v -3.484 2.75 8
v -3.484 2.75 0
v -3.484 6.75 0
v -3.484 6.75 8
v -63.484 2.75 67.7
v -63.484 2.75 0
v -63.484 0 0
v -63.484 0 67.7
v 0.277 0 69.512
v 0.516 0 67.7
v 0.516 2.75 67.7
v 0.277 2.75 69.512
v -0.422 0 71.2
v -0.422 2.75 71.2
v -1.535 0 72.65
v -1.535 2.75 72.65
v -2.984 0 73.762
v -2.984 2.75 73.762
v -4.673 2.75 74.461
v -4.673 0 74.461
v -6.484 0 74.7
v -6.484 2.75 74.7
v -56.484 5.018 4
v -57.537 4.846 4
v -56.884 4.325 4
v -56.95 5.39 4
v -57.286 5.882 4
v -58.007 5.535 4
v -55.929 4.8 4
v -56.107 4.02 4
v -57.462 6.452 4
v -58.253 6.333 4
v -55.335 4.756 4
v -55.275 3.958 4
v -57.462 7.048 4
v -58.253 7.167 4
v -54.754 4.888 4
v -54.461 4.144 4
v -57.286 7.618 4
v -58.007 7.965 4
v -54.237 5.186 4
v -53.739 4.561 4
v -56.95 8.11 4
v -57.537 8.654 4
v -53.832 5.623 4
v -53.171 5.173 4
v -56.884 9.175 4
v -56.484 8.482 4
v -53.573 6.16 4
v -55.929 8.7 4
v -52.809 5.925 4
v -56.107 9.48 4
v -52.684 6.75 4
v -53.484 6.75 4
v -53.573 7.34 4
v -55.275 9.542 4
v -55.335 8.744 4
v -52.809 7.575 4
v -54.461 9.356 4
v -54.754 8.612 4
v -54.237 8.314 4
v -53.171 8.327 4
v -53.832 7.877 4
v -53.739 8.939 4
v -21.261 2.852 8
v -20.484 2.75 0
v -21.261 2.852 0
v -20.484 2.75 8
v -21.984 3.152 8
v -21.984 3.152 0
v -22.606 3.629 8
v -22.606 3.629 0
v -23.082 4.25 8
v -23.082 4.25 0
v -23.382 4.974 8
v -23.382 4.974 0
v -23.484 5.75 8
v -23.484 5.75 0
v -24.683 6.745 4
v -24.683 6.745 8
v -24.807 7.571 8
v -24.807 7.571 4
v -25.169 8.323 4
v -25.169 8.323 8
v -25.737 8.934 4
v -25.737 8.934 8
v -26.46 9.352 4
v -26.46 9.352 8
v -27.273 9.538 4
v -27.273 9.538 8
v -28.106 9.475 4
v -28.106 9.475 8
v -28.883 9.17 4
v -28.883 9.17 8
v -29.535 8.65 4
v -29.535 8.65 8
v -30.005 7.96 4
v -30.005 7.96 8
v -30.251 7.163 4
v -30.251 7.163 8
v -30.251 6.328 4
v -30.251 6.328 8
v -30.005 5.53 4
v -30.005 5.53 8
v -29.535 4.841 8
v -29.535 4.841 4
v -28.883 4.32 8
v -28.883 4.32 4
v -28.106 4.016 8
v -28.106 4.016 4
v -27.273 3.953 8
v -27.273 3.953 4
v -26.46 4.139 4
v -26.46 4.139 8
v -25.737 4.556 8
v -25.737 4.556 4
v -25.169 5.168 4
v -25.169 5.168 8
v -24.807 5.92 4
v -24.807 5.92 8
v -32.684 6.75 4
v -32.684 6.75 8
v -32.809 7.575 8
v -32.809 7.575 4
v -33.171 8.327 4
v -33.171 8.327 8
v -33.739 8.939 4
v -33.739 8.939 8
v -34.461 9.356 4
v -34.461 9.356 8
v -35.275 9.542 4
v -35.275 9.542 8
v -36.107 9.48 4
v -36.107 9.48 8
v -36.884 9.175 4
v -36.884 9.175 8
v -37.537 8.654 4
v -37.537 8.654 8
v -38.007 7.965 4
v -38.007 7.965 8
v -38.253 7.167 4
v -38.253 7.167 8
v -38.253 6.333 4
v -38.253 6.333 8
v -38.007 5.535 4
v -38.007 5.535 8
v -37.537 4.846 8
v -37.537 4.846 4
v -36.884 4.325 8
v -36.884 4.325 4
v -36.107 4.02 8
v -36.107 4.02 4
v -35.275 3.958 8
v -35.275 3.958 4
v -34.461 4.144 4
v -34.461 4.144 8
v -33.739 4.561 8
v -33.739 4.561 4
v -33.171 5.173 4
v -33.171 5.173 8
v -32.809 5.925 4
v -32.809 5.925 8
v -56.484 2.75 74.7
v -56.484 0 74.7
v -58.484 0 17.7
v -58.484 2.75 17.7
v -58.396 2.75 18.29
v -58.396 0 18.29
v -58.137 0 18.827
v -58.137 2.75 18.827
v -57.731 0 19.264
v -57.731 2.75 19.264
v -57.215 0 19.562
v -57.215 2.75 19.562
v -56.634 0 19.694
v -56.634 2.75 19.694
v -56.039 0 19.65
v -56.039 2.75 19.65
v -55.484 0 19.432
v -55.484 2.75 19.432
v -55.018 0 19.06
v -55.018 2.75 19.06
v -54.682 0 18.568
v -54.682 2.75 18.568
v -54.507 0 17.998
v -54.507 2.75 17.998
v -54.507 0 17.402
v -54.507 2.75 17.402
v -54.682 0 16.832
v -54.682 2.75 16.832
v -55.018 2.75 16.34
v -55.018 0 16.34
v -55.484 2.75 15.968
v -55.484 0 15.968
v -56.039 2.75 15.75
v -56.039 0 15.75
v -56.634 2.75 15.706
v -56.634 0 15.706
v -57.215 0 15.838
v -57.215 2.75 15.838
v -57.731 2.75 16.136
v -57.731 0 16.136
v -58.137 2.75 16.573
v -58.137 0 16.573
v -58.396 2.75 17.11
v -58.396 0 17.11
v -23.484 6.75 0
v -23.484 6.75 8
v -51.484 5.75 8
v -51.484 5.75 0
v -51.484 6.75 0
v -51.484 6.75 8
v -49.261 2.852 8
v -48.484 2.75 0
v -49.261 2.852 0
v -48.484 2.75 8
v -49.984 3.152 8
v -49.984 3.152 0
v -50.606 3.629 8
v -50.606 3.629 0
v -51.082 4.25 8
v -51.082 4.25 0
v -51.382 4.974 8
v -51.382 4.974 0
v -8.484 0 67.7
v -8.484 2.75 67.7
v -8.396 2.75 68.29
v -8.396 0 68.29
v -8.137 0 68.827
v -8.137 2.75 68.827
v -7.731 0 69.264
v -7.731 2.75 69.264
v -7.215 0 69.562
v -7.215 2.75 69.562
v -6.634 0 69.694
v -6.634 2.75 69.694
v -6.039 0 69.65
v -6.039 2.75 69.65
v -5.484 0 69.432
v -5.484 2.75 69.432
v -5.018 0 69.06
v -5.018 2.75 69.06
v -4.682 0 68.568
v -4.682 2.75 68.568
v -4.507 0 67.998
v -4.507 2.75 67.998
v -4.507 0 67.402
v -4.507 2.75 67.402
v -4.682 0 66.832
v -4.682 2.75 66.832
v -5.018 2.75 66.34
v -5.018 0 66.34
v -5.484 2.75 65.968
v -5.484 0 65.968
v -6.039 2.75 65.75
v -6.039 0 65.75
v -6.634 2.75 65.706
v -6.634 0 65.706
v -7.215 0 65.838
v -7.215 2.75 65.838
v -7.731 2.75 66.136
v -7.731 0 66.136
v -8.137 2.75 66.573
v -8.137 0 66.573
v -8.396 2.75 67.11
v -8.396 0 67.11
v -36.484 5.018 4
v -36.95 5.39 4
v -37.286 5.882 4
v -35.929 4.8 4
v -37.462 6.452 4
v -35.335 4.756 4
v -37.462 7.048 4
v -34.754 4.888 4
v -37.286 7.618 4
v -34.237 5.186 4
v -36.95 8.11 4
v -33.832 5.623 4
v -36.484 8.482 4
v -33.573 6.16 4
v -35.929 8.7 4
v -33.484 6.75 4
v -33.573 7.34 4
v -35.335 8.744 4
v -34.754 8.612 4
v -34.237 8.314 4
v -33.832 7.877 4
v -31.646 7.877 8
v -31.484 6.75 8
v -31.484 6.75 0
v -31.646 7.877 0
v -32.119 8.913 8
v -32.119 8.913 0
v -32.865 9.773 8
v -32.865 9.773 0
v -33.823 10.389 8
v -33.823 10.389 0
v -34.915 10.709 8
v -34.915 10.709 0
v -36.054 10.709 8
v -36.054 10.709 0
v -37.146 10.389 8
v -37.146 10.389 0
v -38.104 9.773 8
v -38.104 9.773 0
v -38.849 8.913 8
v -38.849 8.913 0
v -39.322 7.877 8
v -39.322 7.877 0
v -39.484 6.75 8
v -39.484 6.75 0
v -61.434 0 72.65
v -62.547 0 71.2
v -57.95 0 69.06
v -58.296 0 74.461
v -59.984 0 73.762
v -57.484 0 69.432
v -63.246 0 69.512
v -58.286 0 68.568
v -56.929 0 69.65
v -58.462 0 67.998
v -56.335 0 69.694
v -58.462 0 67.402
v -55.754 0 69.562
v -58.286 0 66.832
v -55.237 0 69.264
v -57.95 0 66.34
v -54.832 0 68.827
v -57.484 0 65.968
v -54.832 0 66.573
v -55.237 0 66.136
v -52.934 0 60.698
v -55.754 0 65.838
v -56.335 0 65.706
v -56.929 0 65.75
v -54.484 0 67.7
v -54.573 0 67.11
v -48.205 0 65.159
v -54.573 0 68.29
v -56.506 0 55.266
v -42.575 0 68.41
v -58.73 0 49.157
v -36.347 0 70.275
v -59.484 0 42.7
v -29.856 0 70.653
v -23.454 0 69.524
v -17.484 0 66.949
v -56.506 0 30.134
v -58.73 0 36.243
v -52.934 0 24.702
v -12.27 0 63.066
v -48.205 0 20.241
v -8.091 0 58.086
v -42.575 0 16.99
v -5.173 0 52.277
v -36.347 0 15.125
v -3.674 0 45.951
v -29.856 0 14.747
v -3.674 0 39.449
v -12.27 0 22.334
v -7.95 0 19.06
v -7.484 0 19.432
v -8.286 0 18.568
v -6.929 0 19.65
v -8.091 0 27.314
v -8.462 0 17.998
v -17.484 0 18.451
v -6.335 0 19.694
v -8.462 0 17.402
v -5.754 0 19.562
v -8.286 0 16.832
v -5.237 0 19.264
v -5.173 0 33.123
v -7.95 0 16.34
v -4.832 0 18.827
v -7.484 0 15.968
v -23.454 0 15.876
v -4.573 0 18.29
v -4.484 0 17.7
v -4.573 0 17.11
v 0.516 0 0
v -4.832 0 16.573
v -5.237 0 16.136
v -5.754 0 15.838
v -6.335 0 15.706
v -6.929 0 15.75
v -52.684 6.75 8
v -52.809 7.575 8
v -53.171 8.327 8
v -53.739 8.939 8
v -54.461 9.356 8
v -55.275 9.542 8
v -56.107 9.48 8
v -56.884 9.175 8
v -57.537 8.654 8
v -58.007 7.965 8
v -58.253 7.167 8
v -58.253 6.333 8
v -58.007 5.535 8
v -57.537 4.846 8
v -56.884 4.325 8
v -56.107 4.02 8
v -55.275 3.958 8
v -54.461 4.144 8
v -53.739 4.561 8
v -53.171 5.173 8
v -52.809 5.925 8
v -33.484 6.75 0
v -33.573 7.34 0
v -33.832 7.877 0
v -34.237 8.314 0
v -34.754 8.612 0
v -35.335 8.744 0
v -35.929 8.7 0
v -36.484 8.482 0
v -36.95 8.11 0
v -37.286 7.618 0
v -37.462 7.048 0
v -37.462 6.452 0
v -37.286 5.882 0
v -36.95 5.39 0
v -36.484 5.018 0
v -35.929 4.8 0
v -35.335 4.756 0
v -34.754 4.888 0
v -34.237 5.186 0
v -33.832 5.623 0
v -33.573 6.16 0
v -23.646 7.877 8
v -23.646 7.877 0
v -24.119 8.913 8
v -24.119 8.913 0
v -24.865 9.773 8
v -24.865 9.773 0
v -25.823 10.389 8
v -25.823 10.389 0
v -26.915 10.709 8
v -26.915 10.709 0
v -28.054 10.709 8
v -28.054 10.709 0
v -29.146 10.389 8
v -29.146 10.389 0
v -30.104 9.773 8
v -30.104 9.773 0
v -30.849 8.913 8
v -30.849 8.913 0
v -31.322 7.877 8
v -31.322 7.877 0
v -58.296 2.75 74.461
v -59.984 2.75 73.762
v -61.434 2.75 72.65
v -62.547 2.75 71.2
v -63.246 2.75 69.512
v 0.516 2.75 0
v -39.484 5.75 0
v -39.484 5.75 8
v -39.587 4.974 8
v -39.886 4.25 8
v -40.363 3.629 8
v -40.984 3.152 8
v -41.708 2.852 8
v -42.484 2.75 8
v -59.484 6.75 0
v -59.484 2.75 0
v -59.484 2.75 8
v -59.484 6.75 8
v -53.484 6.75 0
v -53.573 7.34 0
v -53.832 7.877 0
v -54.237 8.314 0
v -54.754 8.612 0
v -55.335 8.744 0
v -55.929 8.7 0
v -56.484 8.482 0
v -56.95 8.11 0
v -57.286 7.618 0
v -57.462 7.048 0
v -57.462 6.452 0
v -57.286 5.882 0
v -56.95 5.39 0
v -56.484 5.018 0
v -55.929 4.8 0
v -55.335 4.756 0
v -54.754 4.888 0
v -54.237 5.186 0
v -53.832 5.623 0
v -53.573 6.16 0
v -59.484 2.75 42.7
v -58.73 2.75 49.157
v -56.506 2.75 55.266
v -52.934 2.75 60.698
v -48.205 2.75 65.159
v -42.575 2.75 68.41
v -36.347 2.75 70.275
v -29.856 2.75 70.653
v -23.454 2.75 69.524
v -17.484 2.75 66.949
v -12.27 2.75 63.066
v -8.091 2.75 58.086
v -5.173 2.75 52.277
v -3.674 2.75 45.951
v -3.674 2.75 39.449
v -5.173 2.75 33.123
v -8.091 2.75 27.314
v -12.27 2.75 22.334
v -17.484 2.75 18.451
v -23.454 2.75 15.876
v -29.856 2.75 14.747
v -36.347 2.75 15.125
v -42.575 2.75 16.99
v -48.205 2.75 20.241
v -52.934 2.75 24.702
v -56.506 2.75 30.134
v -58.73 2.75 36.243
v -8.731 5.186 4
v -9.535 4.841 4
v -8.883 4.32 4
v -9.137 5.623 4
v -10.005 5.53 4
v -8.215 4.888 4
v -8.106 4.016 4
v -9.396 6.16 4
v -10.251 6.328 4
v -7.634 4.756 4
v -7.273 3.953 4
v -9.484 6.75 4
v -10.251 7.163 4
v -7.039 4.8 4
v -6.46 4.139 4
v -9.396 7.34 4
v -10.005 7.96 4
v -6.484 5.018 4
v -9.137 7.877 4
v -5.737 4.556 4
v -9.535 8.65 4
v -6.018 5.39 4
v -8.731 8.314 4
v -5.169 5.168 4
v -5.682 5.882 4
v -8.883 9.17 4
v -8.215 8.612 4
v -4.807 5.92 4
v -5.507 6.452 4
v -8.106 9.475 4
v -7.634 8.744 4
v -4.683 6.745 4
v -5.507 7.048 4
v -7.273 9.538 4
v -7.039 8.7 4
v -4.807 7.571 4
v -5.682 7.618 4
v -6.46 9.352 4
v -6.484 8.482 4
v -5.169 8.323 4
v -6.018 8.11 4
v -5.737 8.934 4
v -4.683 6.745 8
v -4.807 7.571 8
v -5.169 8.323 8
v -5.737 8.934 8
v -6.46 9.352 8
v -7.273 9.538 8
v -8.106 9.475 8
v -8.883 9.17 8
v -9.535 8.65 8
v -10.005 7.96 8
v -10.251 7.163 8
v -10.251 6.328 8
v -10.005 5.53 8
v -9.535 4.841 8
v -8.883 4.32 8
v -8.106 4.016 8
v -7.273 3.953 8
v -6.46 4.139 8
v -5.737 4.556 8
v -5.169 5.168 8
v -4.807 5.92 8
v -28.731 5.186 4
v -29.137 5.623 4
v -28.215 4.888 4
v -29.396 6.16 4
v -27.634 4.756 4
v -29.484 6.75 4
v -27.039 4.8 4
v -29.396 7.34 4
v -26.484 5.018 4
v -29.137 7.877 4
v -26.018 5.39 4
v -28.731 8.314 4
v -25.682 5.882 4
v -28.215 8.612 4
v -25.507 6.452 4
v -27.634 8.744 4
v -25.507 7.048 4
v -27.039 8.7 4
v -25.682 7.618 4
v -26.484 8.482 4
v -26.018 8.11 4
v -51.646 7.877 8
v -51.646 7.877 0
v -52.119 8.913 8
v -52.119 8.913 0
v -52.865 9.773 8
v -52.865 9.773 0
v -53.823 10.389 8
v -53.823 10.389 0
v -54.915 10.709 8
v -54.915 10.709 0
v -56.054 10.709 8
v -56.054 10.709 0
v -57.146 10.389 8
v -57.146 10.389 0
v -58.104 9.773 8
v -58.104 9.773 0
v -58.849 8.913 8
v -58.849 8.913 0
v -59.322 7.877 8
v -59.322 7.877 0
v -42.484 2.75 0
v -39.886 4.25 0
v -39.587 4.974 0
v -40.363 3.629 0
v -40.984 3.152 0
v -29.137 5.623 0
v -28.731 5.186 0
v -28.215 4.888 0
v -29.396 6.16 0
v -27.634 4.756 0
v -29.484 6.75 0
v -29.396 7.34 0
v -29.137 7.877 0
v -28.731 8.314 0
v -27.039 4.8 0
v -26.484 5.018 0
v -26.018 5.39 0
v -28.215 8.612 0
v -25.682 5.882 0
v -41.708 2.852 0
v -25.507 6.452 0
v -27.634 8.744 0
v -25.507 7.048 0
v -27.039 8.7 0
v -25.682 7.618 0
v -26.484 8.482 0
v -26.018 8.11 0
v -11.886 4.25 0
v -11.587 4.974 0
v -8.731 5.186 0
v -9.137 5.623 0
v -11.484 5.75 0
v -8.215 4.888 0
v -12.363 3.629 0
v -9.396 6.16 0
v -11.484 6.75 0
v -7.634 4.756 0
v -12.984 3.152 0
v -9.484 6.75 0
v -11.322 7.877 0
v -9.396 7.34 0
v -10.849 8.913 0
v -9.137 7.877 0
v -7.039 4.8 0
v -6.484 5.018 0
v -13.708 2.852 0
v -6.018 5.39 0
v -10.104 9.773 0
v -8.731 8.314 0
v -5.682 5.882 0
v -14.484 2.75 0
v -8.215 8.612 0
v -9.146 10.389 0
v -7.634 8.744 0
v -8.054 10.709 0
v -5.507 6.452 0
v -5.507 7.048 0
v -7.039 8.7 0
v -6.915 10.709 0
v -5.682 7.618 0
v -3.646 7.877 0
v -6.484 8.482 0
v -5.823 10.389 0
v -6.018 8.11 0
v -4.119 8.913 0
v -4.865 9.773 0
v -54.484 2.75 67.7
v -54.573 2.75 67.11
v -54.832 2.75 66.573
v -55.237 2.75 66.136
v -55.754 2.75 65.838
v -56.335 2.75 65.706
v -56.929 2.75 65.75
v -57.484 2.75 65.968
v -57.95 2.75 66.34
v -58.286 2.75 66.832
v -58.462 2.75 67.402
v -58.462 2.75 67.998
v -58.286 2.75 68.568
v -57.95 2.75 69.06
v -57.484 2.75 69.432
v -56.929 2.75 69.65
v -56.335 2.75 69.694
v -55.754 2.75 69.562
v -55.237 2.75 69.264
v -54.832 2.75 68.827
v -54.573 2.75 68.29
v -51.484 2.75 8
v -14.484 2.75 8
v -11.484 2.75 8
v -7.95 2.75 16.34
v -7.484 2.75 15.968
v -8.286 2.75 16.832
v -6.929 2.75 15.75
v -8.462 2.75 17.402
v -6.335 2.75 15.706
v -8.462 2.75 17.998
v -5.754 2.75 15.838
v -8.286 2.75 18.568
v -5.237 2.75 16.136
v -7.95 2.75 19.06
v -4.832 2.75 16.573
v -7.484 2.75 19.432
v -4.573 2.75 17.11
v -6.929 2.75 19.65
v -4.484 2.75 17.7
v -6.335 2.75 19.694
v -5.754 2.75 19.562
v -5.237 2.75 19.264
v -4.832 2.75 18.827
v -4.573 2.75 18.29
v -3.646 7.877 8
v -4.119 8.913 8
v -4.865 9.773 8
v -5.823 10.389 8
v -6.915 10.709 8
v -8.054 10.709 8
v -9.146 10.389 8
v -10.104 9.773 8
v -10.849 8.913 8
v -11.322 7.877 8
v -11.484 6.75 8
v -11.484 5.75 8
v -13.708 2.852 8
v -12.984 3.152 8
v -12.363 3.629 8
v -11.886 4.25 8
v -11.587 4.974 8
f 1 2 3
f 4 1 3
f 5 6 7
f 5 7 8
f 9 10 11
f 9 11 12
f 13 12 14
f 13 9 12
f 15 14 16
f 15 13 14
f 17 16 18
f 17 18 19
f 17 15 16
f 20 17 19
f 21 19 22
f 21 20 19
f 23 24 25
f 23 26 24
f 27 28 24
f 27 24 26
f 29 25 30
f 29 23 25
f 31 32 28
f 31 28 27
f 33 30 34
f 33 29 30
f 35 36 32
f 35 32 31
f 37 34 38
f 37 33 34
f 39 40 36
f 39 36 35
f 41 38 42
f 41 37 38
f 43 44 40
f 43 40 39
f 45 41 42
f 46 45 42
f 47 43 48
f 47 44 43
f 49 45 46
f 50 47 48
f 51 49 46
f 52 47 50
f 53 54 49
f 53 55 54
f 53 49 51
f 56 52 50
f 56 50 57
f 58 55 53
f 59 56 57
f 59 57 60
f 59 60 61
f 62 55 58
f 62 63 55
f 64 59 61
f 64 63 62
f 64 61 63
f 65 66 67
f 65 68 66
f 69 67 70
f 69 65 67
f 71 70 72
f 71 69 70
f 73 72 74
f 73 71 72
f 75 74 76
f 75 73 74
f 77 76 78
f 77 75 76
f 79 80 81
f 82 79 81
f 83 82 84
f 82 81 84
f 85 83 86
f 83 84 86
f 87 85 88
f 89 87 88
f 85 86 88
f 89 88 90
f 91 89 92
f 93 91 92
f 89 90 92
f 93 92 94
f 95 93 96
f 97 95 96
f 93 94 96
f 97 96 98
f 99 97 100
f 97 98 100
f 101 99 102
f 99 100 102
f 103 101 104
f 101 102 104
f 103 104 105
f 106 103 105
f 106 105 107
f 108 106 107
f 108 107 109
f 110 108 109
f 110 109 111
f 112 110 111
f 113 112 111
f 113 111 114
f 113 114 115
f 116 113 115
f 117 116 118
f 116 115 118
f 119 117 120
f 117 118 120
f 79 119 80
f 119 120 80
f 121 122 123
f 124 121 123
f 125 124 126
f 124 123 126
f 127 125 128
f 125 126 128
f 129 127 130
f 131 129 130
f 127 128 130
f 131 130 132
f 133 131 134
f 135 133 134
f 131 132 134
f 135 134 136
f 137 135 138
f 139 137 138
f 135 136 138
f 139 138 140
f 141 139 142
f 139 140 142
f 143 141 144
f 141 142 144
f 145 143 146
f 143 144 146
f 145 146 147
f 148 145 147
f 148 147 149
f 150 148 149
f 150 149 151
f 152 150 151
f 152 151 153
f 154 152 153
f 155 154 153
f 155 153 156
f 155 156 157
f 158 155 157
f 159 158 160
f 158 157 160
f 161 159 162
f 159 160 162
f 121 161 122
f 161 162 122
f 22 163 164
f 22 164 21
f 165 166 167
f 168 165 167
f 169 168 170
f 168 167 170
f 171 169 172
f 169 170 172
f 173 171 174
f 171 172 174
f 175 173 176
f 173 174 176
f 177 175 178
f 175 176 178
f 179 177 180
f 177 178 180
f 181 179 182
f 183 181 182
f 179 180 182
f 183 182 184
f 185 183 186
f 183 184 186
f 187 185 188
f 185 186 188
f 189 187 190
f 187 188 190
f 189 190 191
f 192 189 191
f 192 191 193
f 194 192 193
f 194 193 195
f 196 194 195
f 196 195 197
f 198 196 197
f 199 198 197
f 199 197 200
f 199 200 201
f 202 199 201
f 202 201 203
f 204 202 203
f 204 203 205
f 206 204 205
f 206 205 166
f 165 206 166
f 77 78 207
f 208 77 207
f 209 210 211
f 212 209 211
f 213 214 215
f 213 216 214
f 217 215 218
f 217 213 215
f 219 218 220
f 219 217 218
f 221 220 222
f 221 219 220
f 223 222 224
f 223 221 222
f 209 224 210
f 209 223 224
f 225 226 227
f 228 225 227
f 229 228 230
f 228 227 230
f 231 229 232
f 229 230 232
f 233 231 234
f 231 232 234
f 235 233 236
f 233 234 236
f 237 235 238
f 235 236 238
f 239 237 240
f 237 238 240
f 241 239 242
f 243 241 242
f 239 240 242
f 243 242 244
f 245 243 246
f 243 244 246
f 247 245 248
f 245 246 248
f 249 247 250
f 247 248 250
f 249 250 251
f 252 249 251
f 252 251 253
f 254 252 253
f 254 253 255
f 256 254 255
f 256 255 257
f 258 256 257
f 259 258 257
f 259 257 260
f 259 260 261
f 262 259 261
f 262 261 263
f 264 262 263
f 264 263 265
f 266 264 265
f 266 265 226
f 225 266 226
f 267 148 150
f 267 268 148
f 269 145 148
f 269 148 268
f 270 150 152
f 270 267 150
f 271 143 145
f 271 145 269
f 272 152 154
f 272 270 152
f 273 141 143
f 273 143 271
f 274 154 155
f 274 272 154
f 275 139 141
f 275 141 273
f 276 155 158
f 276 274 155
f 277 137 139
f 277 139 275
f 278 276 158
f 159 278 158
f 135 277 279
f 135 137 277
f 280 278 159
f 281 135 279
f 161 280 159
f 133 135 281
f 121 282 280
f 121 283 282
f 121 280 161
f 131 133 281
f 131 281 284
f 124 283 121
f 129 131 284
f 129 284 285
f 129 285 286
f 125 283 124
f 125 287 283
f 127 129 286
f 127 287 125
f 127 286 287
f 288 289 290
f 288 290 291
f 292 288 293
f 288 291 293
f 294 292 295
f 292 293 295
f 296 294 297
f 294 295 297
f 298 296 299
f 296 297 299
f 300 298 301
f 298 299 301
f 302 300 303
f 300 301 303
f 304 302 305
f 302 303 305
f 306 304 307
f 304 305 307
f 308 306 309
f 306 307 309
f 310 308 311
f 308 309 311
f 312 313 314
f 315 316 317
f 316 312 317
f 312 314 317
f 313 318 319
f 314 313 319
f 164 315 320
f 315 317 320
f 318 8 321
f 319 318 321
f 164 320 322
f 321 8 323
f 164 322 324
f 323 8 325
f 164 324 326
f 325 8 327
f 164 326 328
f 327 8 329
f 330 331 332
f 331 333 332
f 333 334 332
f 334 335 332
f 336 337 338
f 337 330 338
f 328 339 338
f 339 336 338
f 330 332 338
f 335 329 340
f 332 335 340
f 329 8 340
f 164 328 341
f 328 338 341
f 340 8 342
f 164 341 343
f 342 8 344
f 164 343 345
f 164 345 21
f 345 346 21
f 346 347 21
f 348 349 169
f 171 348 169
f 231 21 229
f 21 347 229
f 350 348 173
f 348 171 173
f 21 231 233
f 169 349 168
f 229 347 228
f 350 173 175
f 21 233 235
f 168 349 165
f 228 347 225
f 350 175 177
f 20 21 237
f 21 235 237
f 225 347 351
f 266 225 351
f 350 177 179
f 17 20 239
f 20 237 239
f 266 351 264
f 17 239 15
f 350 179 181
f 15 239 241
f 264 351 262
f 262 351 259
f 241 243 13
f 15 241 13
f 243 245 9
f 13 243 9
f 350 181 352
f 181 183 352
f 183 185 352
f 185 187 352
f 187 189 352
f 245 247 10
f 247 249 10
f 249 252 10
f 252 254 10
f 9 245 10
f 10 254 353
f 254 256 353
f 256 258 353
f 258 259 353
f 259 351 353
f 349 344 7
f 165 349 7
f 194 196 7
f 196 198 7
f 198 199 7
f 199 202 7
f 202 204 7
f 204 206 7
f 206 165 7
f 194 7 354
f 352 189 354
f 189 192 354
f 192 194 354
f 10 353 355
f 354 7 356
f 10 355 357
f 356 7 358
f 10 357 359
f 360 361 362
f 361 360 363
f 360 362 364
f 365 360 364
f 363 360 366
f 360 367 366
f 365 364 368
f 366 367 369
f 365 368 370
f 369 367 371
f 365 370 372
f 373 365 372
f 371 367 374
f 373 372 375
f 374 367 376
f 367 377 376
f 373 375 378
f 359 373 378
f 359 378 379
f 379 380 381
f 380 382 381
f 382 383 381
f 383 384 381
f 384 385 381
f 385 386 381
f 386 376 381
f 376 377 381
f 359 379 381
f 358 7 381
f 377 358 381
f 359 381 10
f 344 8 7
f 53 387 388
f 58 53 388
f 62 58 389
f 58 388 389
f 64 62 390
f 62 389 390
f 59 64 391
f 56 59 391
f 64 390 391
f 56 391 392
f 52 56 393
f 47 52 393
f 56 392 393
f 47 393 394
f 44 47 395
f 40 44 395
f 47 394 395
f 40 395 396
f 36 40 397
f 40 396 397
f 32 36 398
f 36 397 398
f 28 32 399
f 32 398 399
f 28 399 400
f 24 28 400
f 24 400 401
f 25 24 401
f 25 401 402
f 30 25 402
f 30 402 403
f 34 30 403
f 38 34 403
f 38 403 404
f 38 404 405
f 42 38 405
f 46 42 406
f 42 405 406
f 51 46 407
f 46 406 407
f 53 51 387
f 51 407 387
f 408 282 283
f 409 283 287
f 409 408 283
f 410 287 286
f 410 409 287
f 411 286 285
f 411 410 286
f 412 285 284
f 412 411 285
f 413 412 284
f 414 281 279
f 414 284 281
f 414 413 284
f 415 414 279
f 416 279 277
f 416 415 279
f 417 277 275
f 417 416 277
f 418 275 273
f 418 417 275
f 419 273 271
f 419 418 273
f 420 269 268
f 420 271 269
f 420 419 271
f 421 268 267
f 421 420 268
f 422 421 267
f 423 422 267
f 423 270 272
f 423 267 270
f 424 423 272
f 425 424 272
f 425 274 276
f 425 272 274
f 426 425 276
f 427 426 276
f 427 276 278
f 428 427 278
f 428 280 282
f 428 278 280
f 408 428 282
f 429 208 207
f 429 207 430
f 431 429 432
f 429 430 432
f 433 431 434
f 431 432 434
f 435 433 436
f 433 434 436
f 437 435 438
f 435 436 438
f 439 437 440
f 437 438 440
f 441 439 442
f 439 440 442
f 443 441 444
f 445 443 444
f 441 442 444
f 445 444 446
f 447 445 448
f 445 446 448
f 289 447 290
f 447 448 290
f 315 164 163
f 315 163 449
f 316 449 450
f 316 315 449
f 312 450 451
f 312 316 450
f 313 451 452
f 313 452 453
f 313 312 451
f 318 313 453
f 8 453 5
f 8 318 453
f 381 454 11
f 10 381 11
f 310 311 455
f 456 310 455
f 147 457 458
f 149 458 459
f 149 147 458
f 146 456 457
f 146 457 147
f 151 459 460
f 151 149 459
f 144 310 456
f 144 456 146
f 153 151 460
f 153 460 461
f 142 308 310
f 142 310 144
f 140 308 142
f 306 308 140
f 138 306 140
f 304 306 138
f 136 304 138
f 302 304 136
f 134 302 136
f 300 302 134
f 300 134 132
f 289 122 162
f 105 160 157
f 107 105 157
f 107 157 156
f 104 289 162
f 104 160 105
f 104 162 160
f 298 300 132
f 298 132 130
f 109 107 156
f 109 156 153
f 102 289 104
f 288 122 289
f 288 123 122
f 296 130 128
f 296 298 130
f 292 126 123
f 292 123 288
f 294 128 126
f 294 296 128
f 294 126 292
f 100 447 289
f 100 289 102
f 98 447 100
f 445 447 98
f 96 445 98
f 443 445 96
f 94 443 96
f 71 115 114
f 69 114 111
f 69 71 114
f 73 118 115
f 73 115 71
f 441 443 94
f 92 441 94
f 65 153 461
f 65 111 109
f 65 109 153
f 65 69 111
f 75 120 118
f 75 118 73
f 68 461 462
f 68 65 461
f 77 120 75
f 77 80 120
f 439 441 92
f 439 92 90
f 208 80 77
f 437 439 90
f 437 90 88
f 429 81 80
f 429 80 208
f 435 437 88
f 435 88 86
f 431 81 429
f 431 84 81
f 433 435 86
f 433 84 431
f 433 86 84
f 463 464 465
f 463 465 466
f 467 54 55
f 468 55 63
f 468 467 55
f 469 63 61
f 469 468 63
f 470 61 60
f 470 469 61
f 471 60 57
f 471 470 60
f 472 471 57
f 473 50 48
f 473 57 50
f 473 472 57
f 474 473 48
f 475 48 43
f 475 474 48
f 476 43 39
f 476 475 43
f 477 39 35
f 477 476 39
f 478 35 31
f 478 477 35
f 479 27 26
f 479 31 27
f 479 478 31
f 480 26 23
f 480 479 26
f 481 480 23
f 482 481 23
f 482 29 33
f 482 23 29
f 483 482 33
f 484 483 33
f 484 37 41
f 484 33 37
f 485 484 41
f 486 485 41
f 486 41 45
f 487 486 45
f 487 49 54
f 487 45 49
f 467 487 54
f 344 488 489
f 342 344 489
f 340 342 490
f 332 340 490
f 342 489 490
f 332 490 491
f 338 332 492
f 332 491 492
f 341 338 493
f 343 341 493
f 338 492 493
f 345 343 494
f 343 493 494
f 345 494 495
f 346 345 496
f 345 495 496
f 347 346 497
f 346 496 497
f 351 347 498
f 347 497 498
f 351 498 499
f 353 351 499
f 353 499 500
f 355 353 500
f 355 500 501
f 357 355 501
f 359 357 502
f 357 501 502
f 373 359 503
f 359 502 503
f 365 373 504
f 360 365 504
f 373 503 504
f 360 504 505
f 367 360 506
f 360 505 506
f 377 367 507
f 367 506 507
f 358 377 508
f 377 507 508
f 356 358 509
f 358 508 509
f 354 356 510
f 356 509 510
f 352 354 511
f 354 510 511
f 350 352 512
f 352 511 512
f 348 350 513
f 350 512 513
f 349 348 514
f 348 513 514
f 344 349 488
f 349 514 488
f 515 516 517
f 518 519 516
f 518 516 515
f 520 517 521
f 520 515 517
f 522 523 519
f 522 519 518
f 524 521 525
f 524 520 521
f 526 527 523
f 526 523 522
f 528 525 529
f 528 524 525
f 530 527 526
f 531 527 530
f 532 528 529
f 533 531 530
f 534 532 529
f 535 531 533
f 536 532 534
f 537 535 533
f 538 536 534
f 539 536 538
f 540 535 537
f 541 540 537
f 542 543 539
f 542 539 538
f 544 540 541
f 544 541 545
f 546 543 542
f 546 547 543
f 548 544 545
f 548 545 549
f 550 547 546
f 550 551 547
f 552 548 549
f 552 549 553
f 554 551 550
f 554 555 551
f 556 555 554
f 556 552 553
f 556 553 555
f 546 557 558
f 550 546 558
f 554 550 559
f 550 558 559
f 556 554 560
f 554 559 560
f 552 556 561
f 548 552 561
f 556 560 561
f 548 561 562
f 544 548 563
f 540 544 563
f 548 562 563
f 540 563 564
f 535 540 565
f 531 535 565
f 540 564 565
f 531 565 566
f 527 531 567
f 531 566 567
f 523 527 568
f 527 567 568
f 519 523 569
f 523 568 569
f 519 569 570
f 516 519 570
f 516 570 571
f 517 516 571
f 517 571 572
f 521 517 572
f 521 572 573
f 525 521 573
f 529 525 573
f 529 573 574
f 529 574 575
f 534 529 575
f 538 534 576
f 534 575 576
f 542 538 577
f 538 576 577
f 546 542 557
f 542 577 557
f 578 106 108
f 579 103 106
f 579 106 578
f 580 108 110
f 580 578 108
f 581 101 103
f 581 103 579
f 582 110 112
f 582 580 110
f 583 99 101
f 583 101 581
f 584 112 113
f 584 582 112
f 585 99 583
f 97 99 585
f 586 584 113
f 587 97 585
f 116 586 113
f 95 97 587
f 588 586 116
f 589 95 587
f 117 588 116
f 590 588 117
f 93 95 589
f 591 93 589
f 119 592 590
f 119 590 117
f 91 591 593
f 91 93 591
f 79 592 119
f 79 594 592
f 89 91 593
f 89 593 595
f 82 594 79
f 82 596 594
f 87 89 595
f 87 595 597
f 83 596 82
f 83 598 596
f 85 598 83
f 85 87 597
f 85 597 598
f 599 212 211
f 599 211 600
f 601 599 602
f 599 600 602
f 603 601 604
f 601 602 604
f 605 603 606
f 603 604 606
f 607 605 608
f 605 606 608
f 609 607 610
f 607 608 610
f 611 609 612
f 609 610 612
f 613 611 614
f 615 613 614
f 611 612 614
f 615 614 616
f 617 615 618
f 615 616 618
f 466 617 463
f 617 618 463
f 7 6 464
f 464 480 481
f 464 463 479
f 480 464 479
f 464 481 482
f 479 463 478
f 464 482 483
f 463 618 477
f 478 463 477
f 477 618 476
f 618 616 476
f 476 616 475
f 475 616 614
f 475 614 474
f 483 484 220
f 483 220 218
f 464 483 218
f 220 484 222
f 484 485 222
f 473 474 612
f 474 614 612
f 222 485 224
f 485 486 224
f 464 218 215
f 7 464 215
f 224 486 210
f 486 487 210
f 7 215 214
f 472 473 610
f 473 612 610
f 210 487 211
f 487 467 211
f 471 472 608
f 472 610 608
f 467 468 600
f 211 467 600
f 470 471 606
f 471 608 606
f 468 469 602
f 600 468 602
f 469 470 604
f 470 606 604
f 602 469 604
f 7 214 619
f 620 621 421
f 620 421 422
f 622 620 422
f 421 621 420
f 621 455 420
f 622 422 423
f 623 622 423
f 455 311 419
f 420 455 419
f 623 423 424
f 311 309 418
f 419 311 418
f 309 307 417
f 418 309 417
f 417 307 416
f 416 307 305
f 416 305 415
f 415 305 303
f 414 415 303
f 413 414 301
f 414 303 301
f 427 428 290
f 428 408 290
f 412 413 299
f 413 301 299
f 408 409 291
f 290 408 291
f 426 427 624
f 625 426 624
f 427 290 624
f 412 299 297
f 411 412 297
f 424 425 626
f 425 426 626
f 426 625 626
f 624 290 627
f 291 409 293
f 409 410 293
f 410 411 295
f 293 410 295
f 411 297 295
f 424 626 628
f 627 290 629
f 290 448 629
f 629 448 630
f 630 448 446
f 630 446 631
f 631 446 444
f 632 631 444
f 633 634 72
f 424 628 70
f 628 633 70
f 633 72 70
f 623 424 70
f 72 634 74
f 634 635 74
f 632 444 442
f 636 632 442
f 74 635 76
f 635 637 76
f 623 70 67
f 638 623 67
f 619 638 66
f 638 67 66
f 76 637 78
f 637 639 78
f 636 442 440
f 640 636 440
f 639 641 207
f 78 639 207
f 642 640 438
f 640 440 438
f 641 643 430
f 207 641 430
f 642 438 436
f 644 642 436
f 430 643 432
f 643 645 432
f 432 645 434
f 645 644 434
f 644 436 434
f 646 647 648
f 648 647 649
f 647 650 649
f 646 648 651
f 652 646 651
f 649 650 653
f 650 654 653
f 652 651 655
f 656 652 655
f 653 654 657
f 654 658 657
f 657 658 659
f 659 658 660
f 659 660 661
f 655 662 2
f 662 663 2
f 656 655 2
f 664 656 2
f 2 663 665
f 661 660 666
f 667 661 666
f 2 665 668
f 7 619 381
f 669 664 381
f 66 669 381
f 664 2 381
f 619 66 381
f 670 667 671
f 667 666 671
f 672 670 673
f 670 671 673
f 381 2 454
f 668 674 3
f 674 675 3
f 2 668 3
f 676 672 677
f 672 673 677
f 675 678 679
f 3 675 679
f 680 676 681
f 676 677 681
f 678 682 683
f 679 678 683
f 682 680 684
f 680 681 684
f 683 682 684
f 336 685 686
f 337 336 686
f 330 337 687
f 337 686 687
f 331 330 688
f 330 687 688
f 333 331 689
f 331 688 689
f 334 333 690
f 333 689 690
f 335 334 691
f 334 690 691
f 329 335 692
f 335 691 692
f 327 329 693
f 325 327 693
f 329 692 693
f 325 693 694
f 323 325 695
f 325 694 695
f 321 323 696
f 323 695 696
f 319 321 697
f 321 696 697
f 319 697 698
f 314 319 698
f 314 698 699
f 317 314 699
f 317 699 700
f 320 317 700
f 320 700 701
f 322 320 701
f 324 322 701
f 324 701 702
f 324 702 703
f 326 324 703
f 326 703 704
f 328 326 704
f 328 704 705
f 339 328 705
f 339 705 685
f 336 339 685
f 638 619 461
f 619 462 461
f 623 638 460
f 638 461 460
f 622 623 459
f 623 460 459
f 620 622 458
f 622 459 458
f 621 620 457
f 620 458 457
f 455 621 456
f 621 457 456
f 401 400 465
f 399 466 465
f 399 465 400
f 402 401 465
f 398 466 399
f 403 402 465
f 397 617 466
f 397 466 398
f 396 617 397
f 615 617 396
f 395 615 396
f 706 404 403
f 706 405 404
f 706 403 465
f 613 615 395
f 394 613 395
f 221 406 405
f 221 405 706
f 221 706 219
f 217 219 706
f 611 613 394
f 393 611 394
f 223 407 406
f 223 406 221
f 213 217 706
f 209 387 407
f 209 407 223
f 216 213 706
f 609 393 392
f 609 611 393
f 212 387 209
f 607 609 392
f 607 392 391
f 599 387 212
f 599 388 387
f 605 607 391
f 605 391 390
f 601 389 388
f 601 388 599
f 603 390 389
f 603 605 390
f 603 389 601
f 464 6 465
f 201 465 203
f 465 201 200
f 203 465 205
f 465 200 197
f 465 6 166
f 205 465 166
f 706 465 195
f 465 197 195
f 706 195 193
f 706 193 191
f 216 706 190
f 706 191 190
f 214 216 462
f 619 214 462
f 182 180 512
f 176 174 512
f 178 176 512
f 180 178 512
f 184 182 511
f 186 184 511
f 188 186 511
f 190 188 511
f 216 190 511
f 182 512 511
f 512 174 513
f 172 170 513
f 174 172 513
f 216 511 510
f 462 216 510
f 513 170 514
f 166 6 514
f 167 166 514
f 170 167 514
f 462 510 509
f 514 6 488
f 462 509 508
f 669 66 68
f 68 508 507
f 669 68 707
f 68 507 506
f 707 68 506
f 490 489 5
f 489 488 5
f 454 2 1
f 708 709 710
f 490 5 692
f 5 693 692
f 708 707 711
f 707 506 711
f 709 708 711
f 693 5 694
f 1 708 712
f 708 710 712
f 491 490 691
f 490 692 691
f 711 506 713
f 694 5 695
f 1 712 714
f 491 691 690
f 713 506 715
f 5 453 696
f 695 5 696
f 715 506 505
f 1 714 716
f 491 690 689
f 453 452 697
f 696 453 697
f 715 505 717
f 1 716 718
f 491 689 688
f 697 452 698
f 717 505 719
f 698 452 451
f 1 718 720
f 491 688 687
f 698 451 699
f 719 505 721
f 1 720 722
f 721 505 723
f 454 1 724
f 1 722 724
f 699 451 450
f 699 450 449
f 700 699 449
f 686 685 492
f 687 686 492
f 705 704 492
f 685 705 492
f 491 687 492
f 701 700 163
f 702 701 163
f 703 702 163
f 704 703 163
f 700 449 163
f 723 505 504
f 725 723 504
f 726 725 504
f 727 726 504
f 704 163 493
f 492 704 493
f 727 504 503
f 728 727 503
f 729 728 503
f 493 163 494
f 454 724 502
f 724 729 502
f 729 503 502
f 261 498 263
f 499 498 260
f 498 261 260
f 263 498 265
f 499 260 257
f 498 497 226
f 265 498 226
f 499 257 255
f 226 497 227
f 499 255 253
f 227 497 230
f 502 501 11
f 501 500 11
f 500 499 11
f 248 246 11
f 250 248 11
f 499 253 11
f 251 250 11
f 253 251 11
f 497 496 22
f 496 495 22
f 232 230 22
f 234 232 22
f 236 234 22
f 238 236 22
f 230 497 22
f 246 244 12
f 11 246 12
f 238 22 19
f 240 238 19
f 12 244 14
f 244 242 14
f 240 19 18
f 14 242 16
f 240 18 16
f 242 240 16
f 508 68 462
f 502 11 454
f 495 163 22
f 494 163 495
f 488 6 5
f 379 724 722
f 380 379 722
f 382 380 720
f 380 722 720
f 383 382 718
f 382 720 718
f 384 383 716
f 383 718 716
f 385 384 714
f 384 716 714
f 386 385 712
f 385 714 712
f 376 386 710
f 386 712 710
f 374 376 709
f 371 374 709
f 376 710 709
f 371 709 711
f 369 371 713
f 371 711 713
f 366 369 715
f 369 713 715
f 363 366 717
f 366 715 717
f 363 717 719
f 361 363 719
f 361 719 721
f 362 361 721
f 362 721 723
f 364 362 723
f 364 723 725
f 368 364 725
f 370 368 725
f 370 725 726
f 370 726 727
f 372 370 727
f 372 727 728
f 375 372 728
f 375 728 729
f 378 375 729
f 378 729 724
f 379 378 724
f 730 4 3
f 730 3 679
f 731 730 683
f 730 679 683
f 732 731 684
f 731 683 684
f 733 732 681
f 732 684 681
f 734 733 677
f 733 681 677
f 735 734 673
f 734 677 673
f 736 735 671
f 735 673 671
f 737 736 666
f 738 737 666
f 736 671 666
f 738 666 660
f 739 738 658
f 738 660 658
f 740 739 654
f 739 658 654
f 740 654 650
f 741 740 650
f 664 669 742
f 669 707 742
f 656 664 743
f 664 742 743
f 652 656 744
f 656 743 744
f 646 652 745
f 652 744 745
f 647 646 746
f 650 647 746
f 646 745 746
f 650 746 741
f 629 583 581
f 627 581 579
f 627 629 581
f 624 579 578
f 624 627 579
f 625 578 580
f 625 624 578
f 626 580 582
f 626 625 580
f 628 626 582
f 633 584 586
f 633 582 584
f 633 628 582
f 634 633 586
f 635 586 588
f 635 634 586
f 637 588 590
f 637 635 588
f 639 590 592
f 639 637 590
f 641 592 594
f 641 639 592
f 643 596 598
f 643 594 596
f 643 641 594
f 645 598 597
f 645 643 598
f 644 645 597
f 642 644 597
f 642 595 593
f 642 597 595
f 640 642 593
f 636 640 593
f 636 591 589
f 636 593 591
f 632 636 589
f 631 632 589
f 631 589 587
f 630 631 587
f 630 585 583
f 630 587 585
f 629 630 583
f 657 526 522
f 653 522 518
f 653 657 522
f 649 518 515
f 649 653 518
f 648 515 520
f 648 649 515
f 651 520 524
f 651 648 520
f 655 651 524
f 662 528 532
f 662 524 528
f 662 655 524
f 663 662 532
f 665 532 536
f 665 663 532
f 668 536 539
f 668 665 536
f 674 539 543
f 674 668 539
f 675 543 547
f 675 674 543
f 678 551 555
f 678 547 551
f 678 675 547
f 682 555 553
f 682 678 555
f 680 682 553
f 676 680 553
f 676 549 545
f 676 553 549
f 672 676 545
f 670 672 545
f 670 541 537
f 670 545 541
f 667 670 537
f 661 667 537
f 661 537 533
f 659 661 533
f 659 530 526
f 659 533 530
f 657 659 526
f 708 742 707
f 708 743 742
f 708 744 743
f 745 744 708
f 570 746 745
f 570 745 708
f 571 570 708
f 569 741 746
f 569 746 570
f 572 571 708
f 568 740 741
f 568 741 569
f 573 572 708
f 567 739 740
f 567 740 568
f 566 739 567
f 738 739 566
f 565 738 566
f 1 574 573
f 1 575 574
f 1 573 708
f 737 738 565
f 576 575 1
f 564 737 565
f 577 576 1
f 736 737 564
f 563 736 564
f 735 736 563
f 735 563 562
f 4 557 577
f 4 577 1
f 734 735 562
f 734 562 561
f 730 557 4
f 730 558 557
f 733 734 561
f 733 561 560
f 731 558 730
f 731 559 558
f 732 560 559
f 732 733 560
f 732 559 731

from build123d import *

# Parameters (mm, degrees)
SCHIZZO1_R                        = 2
ESTRUSIONE_ESTRUSIONE1_DEPTH      = 8
SCHIZZO3_W                        = 50
SCHIZZO3_H                        = 2.75
ESTRUSIONE_ESTRUSIONE3_DEPTH      = 55
RACCORDO1_R                       = 4
SCHIZZO4_R                        = 23
TAGLIO_ESTRUSIONE1_DEPTH          = 4
SCHIZZO5_R                        = 2
TAGLIO_ESTRUSIONE2_DEPTH          = 4
RACCORDO2_R                       = 124
SCHIZZO6_R                        = 2.8
TAGLIO_ESTRUSIONE3_DEPTH          = 4
SCHIZZO7_W                        = 64
SCHIZZO7_H                        = 66
SCHIZZO7_R                        = 28
ESTRUSIONE_ESTRUSIONE4_DEPTH      = 4
SCHIZZO8_R                        = 28
TAGLIO_ESTRUSIONE4_DEPTH          = 10
SCHIZZO9_R                        = 2
TAGLIO_ESTRUSIONE5_DEPTH          = 4
RACCORDO3_R                       = 3
RACCORDO4_R                       = 3
RACCORDO5_R                       = 3
SCHIZZO10_W                       = 88.736042833
SCHIZZO10_H                       = 81.022332295
TAGLIO_ESTRUSIONE6_DEPTH          = 1.25
SCHIZZO11_W                       = 58
SCHIZZO11_H                       = 2.75
ESTRUSIONE_ESTRUSIONE5_DEPTH      = 0.7
RACCORDO6_START                   = -1
RACCORDO6_DEPTH                   = 5
RACCORDO8_START                   = -1
RACCORDO8_DEPTH                   = 5
ESTRUSIONE_ESTRUSIONE6_DEPTH      = 4
ESTRUSIONE_ESTRUSIONE6_DEPTH_BACK = 2.75
SCHIZZO12_W                       = 64
SCHIZZO12_H                       = 11.748328584
TAGLIO_ESTRUSIONE7_DEPTH          = 4
SCHIZZO15_W                       = 64
SCHIZZO15_H                       = 14.540634193
TAGLIO_ESTRUSIONE8_DEPTH          = 4


with BuildPart() as part:
    # Schizzo1 → Estrusione-Estrusione1 (new body)
    with BuildSketch(Plane.XY):
        with BuildLine():
            Line((-59.484364928, 0), (-3.484364928, 0))
            Line((-3.484364928, 0), (-3.484364928, 6.75))
            ThreePointArc((-3.484364928, 6.75), (-7.484364928, 10.75), (-11.484364928, 6.75))
            Line((-11.484364928, 6.75), (-11.484364928, 2.75))
            Line((-11.484364928, 2.75), (-23.484364928, 2.75))
            Line((-23.484364928, 2.75), (-23.484364928, 6.75))
            ThreePointArc((-23.484364928, 6.75), (-27.484364928, 10.75), (-31.484364928, 6.75))
            ThreePointArc((-31.484364928, 6.75), (-35.484364928, 10.75), (-39.484364928, 6.75))
            Line((-39.484364928, 6.75), (-39.484364928, 2.75))
            Line((-39.484364928, 2.75), (-51.484364928, 2.75))
            Line((-51.484364928, 2.75), (-51.484364928, 6.75))
            ThreePointArc((-51.484364928, 6.75), (-55.484364928, 10.75), (-59.484364928, 6.75))
            Line((-59.484364928, 6.75), (-59.484364928, 0))
        make_face()
        with Locations((-35.484364928, 6.75)):
            Circle(SCHIZZO1_R, mode=Mode.SUBTRACT)
        with Locations(Location((-27.484364928, 6.75, 0), (0, 0, 180))):
            Circle(SCHIZZO1_R, mode=Mode.SUBTRACT)
        with Locations((-55.484364928, 6.75)):
            Circle(SCHIZZO1_R, mode=Mode.SUBTRACT)
        with Locations(Location((-7.484364928, 6.75, 0), (0, 0, 180))):
            Circle(SCHIZZO1_R, mode=Mode.SUBTRACT)
    extrude(amount=ESTRUSIONE_ESTRUSIONE1_DEPTH)

    # Schizzo3 → Estrusione-Estrusione3 (add)
    with BuildSketch(Plane.XY.offset(8)):
        with Locations((-31.482821648, 1.375)):
            Rectangle(SCHIZZO3_W, SCHIZZO3_H)
    extrude(amount=ESTRUSIONE_ESTRUSIONE3_DEPTH)

    # Raccordo1
    raccordo1_edges = [part.edges().sort_by_distance(p)[0] for p in [
        (-56.482821648, 1.375, 63),
        (-6.482821648, 1.375, 63),
    ]]
    fillet(raccordo1_edges, radius=RACCORDO1_R)

    # Schizzo4 → Taglio-Estrusione1 (cut)
    with BuildSketch(Plane(origin=(0, 2.75, 0), x_dir=(1, 0, 0), z_dir=(0, 1, 0))):
        with Locations(Location((-31.482821648, -35.97589666, 0), (0, 0, 180))):
            Circle(SCHIZZO4_R)
    extrude(amount=-TAGLIO_ESTRUSIONE1_DEPTH, mode=Mode.SUBTRACT)

    # Schizzo5 → Taglio-Estrusione2 (cut)
    with BuildSketch(Plane(origin=(0, 2.75, 0), x_dir=(1, 0, 0), z_dir=(0, 1, 0))):
        with Locations(Location((-51.482821648, -15.97589666, 0), (0, 0, 180))):
            Circle(SCHIZZO5_R)
        with Locations(Location((-51.482821648, -55.97589666, 0), (0, 0, 180))):
            Circle(SCHIZZO5_R)
        with Locations(Location((-11.482821648, -15.97589666, 0), (0, 0, 180))):
            Circle(SCHIZZO5_R)
        with Locations(Location((-11.482821648, -55.97589666, 0), (0, 0, 180))):
            Circle(SCHIZZO5_R)
    extrude(amount=-TAGLIO_ESTRUSIONE2_DEPTH, mode=Mode.SUBTRACT)

    # Raccordo2
    # the kernel refuses this fillet: 124 mm, written as the material it adds along each edge
    with BuildSketch(Plane(origin=(-56.482821648, 2.75, 8), x_dir=(0, 0, 1), z_dir=(0, -1, 0))) as raccordo2_piece_1:
        with BuildLine():
            CenterArc((27.117770399, 124), RACCORDO2_R, 257.367798326, 12.632201674)
            Line((0, 3.00154328), (0, 0))
            Line((0, 0), (27.117770399, 0))
        make_face()
    extrude(amount=2.75)
    with BuildSketch(Plane(origin=(-6.482821648, 0, 8), x_dir=(0, 0, 1), z_dir=(0, 1, 0))) as raccordo2_piece_2:
        with BuildLine():
            CenterArc((27.10399461, 124), RACCORDO2_R, 257.374321421, 12.625678579)
            Line((0, 2.99845672), (0, 0))
            Line((0, 0), (27.10399461, 0))
        make_face()
    extrude(amount=2.75)

    # Schizzo6 → Taglio-Estrusione3 (cut)
    with BuildSketch(Plane.XY.offset(8)):
        with Locations((-55.484364928, 6.75)):
            Circle(SCHIZZO6_R)
        with Locations((-35.484364928, 6.75)):
            Circle(SCHIZZO6_R)
        with Locations((-27.48263887, 6.745335699)):
            Circle(SCHIZZO6_R)
        with Locations((-7.48260826, 6.745335699)):
            Circle(SCHIZZO6_R)
    extrude(amount=-TAGLIO_ESTRUSIONE3_DEPTH, mode=Mode.SUBTRACT)

    # Schizzo7 → Estrusione-Estrusione4 (add)
    with BuildSketch(Plane(origin=(0, 2.75, 0), x_dir=(1, 0, 0), z_dir=(0, 1, 0))):
        with Locations((-31.484364928, -41)):
            Rectangle(SCHIZZO7_W, SCHIZZO7_H)
        with Locations(Location((-31.484364928, -42.7, 0), (0, 0, 180))):
            Circle(SCHIZZO7_R, mode=Mode.SUBTRACT)
    extrude(amount=-ESTRUSIONE_ESTRUSIONE4_DEPTH)

    # Schizzo8 → Taglio-Estrusione4 (cut)
    with BuildSketch(Plane(origin=(0, 2.75, 0), x_dir=(1, 0, 0), z_dir=(0, 1, 0))):
        with Locations(Location((-31.484364928, -42.7, 0), (0, 0, 180))):
            Circle(SCHIZZO8_R)
    extrude(amount=-TAGLIO_ESTRUSIONE4_DEPTH, mode=Mode.SUBTRACT)

    # Schizzo9 → Taglio-Estrusione5 (cut)
    with BuildSketch(Plane(origin=(0, 2.75, 0), x_dir=(1, 0, 0), z_dir=(0, 1, 0))):
        with Locations(Location((-6.484364928, -67.7, 0), (0, 0, 180))):
            Circle(SCHIZZO9_R)
        with Locations((-6.484364928, -17.7)):
            Circle(SCHIZZO9_R)
        with Locations((-56.484364928, -67.7)):
            Circle(SCHIZZO9_R)
        with Locations(Location((-56.484364928, -17.7, 0), (0, 0, 180))):
            Circle(SCHIZZO9_R)
    extrude(amount=-TAGLIO_ESTRUSIONE5_DEPTH, mode=Mode.SUBTRACT)

    # Raccordo3
    # the kernel refuses this fillet: 3 mm, written as the material it adds along each edge
    with BuildSketch(Plane(origin=(-59.484364928, 0, 8), x_dir=(0, -1, 0), z_dir=(1, 0, 0))) as raccordo3_piece_1:
        with BuildLine():
            CenterArc((3, 2.436698586), RACCORDO3_R, 180, 54.314665287)
            Line((0, 2.436698586), (0, 0))
            Line((0, 0), (1.25, 0))
        make_face()
    extrude(amount=56)
    with BuildSketch(Plane(origin=(-3.484364928, 0, 8), x_dir=(1, 0, 0), z_dir=(0, 1, 0)), Plane(origin=(-59.484364928, 2.75, 8), x_dir=(-1, 0, 0), z_dir=(0, -1, 0))) as raccordo3_piece_2:
        with BuildLine():
            CenterArc((RACCORDO3_R, RACCORDO3_R), RACCORDO3_R, 180, 90)
            Line((0, RACCORDO3_R), (0, 0))
            Line((0, 0), (RACCORDO3_R, 0))
        make_face()
    extrude(amount=2.75)
    with BuildSketch(Plane(origin=(-65.576111393, 0, 8), x_dir=(0, -1, 0), z_dir=(1, 0, 0))) as raccordo3_piece_3a_section:
        with BuildLine():
            CenterArc((3, 2.436698586), RACCORDO3_R, 180, 54.314665287)
            Line((0, 2.436698586), (0, 0))
            Line((0, 0), (1.25, 0))
        make_face()
    raccordo3_piece_3a = extrude(amount=62.091746466, mode=Mode.PRIVATE)
    raccordo3_piece_3a = split(raccordo3_piece_3a, bisect_by=Plane(origin=(-63.484364928, 0, 8), z_dir=(1, 0, 0)), keep=Keep.TOP, mode=Mode.PRIVATE)
    raccordo3_piece_3a = split(raccordo3_piece_3a, bisect_by=Plane(origin=(-59.484364928, 0, 8), z_dir=(-1, 0, 0)), keep=Keep.TOP, mode=Mode.PRIVATE)
    with BuildSketch(Plane(origin=(-59.484364928, 2.75, 8), x_dir=(-1, 0, 0), z_dir=(0, -1, 0))) as raccordo3_piece_3b_section:
        with BuildLine():
            CenterArc((RACCORDO3_R, RACCORDO3_R), RACCORDO3_R, 180, 90)
            Line((0, RACCORDO3_R), (0, 0))
            Line((0, 0), (RACCORDO3_R, 0))
        make_face()
    raccordo3_piece_3b = extrude(amount=10.25, mode=Mode.PRIVATE)
    raccordo3_piece_3b = split(raccordo3_piece_3b, bisect_by=Plane(origin=(-59.484364928, 0, 8), z_dir=(0, -1, 0)), keep=Keep.TOP, mode=Mode.PRIVATE)
    raccordo3_piece_3b = split(raccordo3_piece_3b, bisect_by=Plane(origin=(-59.484364928, -1.25, 8), z_dir=(0, 1, 0)), keep=Keep.TOP, mode=Mode.PRIVATE)
    raccordo3_piece_3 = raccordo3_piece_3a & raccordo3_piece_3b
    add(raccordo3_piece_3)
    with BuildSketch(Plane(origin=(-3.484364928, -7.5, 8), x_dir=(1, 0, 0), z_dir=(0, 1, 0))) as raccordo3_piece_4a_section:
        with BuildLine():
            CenterArc((RACCORDO3_R, RACCORDO3_R), RACCORDO3_R, 180, 90)
            Line((0, RACCORDO3_R), (0, 0))
            Line((0, 0), (RACCORDO3_R, 0))
        make_face()
    raccordo3_piece_4a = extrude(amount=10.25, mode=Mode.PRIVATE)
    raccordo3_piece_4a = split(raccordo3_piece_4a, bisect_by=Plane(origin=(-3.484364928, 0, 8), z_dir=(0, -1, 0)), keep=Keep.TOP, mode=Mode.PRIVATE)
    raccordo3_piece_4a = split(raccordo3_piece_4a, bisect_by=Plane(origin=(-3.484364928, -1.25, 8), z_dir=(0, 1, 0)), keep=Keep.TOP, mode=Mode.PRIVATE)
    with BuildSketch(Plane(origin=(-59.484364928, 0, 8), x_dir=(0, -1, 0), z_dir=(1, 0, 0))) as raccordo3_piece_4b_section:
        with BuildLine():
            CenterArc((3, 2.436698586), RACCORDO3_R, 180, 54.314665287)
            Line((0, 2.436698586), (0, 0))
            Line((0, 0), (1.25, 0))
        make_face()
    raccordo3_piece_4b = extrude(amount=62.091746466, mode=Mode.PRIVATE)
    raccordo3_piece_4b = split(raccordo3_piece_4b, bisect_by=Plane(origin=(0.515635072, 0, 8), z_dir=(-1, 0, 0)), keep=Keep.TOP, mode=Mode.PRIVATE)
    raccordo3_piece_4b = split(raccordo3_piece_4b, bisect_by=Plane(origin=(-3.484364928, 0, 8), z_dir=(1, 0, 0)), keep=Keep.TOP, mode=Mode.PRIVATE)
    raccordo3_piece_4 = raccordo3_piece_4a & raccordo3_piece_4b
    add(raccordo3_piece_4)
    # the kernel refuses this fillet: 3 mm, written as the material it takes off along each edge
    with BuildSketch(Plane(origin=(0.515635072, 10.25, 74), x_dir=(-1, 0, 0), z_dir=(0, -1, 0)), Plane(origin=(-63.484364928, 10.25, 74), x_dir=(0, 0, -1), z_dir=(0, -1, 0))) as raccordo3_2_piece_1:
        with BuildLine():
            CenterArc((RACCORDO3_R, RACCORDO3_R), RACCORDO3_R, 180, 90)
            Line((0, RACCORDO3_R), (0, 0))
            Line((0, 0), (RACCORDO3_R, 0))
        make_face()
    extrude(amount=19, mode=Mode.SUBTRACT)

    # Raccordo4
    # the kernel refuses this fillet: 3 mm, written as the material it takes off along each edge
    with BuildSketch(Plane(origin=(-63.484364928, 9.392135624, 8), x_dir=(0.9963405296085128, 0, -0.08547250469845889), z_dir=(0, -1, 0))) as raccordo4_piece_1:
        with BuildLine():
            CenterArc((2.761933602, 2.903549084), RACCORDO4_R, 184.903196278, 70.528779366)
            Line((-0.227087987, 2.64713157), (-0.525990146, 2.621489819))
            Line((-0.525990146, 2.621489819), (-0.298902159, -0.025641751))
            Line((-0.298902159, -0.025641751), (0.025641751, -0.298902159))
            ThreePointArc((0.025641751, -0.298902159), (1.021982281, -0.213429654), (1.931887045, -0.290354908))
            Line((1.931887045, -0.290354908), (2.007345823, 0))
        make_face()
    extrude(amount=17.284271247, mode=Mode.SUBTRACT)
    with BuildSketch(Plane(origin=(0.515635072, 9.392135624, 8), x_dir=(-0.9963405296085196, 0, -0.08547250469837912), z_dir=(0, -1, 0))) as raccordo4_piece_2:
        with BuildLine():
            CenterArc((2.761933602, -2.903549084), RACCORDO4_R, 104.568024357, 70.528779366)
            Line((-0.227087987, -2.64713157), (-0.525990146, -2.621489819))
            Line((-0.525990146, -2.621489819), (-0.298902159, 0.025641751))
            Line((-0.298902159, 0.025641751), (0.025641751, 0.298902159))
            ThreePointArc((0.025641751, 0.298902159), (1.021982281, 0.213429654), (1.931887045, 0.290354908))
            Line((1.931887045, 0.290354908), (2.007345823, 0))
        make_face()
    extrude(amount=17.284271247, mode=Mode.SUBTRACT)

    # Raccordo5
    raccordo5_edges = [part.edges().sort_by_distance(p)[0] for p in [
        (-39.484364928, 2.75, 4),
        (-51.484364928, 2.75, 4),
        (-23.484364928, 2.75, 4),
        (-11.484364928, 2.75, 4),
    ]]
    fillet(raccordo5_edges, radius=RACCORDO5_R)

    # Schizzo10 → Taglio-Estrusione6 (cut)
    with BuildSketch(Plane.XZ.offset(1.25)):
        with Locations((-36.992061707, 40.511166147)):
            Rectangle(SCHIZZO10_W, SCHIZZO10_H)
    extrude(amount=-TAGLIO_ESTRUSIONE6_DEPTH, mode=Mode.SUBTRACT)

    # Schizzo11 → Estrusione-Estrusione5 (add)
    with BuildSketch(Plane.XY.offset(74)):
        with Locations((-31.484364928, 1.375)):
            Rectangle(SCHIZZO11_W, SCHIZZO11_H)
    extrude(amount=ESTRUSIONE_ESTRUSIONE5_DEPTH)

    # Raccordo6: read off the stored shape, not the designer's step
    # Raccordo6 outline → Raccordo6 (cut)
    with BuildSketch(Plane(origin=(0, 0, 0), x_dir=(1, 0, 0), z_dir=(0, 1, 0)).offset(RACCORDO6_START)):
        with BuildLine():
            Line((-60.484364928, -74.7), (-56.484364928, -74.7))
            ThreePointArc((-56.484364928, -74.7), (-61.434112396, -72.649747468), (-63.484364928, -67.7))
            Line((-63.484364928, -67.7), (-63.484364928, -71))
            ThreePointArc((-63.484364928, -71), (-62.605685271, -73.121320344), (-60.484364928, -74))
            Line((-60.484364928, -74), (-60.484364928, -74.7))
        make_face()
    extrude(amount=RACCORDO6_DEPTH, mode=Mode.SUBTRACT)

    # Raccordo8: read off the stored shape, not the designer's step
    # Raccordo8 outline → Raccordo8 (cut)
    with BuildSketch(Plane(origin=(0, 0, 0), x_dir=(1, 0, 0), z_dir=(0, 1, 0)).offset(RACCORDO8_START)):
        with BuildLine():
            ThreePointArc((0.515635072, -67.7), (-1.53461746, -72.649747468), (-6.484364928, -74.7))
            Line((-6.484364928, -74.7), (-2.484364928, -74.7))
            Line((-2.484364928, -74.7), (-2.484364928, -74))
            ThreePointArc((-2.484364928, -74), (-0.363044584, -73.121320344), (0.515635072, -71))
            Line((0.515635072, -71), (0.515635072, -67.7))
        make_face()
    extrude(amount=RACCORDO8_DEPTH, mode=Mode.SUBTRACT)

    # Schizzo12 → Estrusione-Estrusione6 (add, two sides: drawn at the far end of the back side and taken through both)
    with BuildSketch(Plane.XZ.offset(-ESTRUSIONE_ESTRUSIONE6_DEPTH_BACK)):
        with Locations((-31.484364928, 5.874164292)):
            Rectangle(SCHIZZO12_W, SCHIZZO12_H)
    extrude(amount=ESTRUSIONE_ESTRUSIONE6_DEPTH + ESTRUSIONE_ESTRUSIONE6_DEPTH_BACK)

    # Schizzo14 → Taglio-Estrusione7 (cut)
    with BuildSketch(Plane.XZ.offset(4)):
        with BuildLine():
            ThreePointArc((-63.784364872, 15.695561242), (-63.487200964, 13.638374938), (-62.622304057, 11.748328584))
            Line((-62.622304057, 11.748328584), (-31.484364928, 11.748328584))
            Line((-31.484364928, 11.748328584), (-31.484364928, 15.695561242))
            Line((-31.484364928, 15.695561242), (-63.784364872, 15.695561242))
        make_face()
        with BuildLine():
            Line((-31.484364928, 15.695561242), (-31.484364928, 11.748328584))
            Line((-31.484364928, 11.748328584), (-0.346425799, 11.748328584))
            ThreePointArc((-0.346425799, 11.748328584), (0.518471108, 13.638374938), (0.815635017, 15.695561242))
            Line((0.815635017, 15.695561242), (-31.484364928, 15.695561242))
        make_face()
        with BuildLine():
            Line((-31.484364928, 11.748328584), (-31.484364928, 8.4))
            Line((-31.484364928, 8.4), (-30.756456371, 8.4))
            Line((-30.756456371, 8.4), (-6.48436489, 8.4))
            ThreePointArc((-6.48436489, 8.4), (-2.988453083, 9.291521392), (-0.346425799, 11.748328584))
            Line((-0.346425799, 11.748328584), (-31.484364928, 11.748328584))
        make_face()
        with BuildLine():
            ThreePointArc((-62.622304057, 11.748328584), (-59.980276772, 9.291521392), (-56.484364966, 8.4))
            Line((-56.484364966, 8.4), (-32.212273485, 8.4))
            Line((-32.212273485, 8.4), (-31.484364928, 8.4))
            Line((-31.484364928, 8.4), (-31.484364928, 11.748328584))
            Line((-31.484364928, 11.748328584), (-62.622304057, 11.748328584))
        make_face()
    extrude(amount=-TAGLIO_ESTRUSIONE7_DEPTH, mode=Mode.SUBTRACT)

    # Schizzo15 → Taglio-Estrusione8 (cut)
    with BuildSketch(Plane.XZ.offset(4)):
        with Locations((-31.484364928, 7.270317097)):
            Rectangle(SCHIZZO15_W, SCHIZZO15_H)
    extrude(amount=-TAGLIO_ESTRUSIONE8_DEPTH, mode=Mode.SUBTRACT)


solid = part.part
